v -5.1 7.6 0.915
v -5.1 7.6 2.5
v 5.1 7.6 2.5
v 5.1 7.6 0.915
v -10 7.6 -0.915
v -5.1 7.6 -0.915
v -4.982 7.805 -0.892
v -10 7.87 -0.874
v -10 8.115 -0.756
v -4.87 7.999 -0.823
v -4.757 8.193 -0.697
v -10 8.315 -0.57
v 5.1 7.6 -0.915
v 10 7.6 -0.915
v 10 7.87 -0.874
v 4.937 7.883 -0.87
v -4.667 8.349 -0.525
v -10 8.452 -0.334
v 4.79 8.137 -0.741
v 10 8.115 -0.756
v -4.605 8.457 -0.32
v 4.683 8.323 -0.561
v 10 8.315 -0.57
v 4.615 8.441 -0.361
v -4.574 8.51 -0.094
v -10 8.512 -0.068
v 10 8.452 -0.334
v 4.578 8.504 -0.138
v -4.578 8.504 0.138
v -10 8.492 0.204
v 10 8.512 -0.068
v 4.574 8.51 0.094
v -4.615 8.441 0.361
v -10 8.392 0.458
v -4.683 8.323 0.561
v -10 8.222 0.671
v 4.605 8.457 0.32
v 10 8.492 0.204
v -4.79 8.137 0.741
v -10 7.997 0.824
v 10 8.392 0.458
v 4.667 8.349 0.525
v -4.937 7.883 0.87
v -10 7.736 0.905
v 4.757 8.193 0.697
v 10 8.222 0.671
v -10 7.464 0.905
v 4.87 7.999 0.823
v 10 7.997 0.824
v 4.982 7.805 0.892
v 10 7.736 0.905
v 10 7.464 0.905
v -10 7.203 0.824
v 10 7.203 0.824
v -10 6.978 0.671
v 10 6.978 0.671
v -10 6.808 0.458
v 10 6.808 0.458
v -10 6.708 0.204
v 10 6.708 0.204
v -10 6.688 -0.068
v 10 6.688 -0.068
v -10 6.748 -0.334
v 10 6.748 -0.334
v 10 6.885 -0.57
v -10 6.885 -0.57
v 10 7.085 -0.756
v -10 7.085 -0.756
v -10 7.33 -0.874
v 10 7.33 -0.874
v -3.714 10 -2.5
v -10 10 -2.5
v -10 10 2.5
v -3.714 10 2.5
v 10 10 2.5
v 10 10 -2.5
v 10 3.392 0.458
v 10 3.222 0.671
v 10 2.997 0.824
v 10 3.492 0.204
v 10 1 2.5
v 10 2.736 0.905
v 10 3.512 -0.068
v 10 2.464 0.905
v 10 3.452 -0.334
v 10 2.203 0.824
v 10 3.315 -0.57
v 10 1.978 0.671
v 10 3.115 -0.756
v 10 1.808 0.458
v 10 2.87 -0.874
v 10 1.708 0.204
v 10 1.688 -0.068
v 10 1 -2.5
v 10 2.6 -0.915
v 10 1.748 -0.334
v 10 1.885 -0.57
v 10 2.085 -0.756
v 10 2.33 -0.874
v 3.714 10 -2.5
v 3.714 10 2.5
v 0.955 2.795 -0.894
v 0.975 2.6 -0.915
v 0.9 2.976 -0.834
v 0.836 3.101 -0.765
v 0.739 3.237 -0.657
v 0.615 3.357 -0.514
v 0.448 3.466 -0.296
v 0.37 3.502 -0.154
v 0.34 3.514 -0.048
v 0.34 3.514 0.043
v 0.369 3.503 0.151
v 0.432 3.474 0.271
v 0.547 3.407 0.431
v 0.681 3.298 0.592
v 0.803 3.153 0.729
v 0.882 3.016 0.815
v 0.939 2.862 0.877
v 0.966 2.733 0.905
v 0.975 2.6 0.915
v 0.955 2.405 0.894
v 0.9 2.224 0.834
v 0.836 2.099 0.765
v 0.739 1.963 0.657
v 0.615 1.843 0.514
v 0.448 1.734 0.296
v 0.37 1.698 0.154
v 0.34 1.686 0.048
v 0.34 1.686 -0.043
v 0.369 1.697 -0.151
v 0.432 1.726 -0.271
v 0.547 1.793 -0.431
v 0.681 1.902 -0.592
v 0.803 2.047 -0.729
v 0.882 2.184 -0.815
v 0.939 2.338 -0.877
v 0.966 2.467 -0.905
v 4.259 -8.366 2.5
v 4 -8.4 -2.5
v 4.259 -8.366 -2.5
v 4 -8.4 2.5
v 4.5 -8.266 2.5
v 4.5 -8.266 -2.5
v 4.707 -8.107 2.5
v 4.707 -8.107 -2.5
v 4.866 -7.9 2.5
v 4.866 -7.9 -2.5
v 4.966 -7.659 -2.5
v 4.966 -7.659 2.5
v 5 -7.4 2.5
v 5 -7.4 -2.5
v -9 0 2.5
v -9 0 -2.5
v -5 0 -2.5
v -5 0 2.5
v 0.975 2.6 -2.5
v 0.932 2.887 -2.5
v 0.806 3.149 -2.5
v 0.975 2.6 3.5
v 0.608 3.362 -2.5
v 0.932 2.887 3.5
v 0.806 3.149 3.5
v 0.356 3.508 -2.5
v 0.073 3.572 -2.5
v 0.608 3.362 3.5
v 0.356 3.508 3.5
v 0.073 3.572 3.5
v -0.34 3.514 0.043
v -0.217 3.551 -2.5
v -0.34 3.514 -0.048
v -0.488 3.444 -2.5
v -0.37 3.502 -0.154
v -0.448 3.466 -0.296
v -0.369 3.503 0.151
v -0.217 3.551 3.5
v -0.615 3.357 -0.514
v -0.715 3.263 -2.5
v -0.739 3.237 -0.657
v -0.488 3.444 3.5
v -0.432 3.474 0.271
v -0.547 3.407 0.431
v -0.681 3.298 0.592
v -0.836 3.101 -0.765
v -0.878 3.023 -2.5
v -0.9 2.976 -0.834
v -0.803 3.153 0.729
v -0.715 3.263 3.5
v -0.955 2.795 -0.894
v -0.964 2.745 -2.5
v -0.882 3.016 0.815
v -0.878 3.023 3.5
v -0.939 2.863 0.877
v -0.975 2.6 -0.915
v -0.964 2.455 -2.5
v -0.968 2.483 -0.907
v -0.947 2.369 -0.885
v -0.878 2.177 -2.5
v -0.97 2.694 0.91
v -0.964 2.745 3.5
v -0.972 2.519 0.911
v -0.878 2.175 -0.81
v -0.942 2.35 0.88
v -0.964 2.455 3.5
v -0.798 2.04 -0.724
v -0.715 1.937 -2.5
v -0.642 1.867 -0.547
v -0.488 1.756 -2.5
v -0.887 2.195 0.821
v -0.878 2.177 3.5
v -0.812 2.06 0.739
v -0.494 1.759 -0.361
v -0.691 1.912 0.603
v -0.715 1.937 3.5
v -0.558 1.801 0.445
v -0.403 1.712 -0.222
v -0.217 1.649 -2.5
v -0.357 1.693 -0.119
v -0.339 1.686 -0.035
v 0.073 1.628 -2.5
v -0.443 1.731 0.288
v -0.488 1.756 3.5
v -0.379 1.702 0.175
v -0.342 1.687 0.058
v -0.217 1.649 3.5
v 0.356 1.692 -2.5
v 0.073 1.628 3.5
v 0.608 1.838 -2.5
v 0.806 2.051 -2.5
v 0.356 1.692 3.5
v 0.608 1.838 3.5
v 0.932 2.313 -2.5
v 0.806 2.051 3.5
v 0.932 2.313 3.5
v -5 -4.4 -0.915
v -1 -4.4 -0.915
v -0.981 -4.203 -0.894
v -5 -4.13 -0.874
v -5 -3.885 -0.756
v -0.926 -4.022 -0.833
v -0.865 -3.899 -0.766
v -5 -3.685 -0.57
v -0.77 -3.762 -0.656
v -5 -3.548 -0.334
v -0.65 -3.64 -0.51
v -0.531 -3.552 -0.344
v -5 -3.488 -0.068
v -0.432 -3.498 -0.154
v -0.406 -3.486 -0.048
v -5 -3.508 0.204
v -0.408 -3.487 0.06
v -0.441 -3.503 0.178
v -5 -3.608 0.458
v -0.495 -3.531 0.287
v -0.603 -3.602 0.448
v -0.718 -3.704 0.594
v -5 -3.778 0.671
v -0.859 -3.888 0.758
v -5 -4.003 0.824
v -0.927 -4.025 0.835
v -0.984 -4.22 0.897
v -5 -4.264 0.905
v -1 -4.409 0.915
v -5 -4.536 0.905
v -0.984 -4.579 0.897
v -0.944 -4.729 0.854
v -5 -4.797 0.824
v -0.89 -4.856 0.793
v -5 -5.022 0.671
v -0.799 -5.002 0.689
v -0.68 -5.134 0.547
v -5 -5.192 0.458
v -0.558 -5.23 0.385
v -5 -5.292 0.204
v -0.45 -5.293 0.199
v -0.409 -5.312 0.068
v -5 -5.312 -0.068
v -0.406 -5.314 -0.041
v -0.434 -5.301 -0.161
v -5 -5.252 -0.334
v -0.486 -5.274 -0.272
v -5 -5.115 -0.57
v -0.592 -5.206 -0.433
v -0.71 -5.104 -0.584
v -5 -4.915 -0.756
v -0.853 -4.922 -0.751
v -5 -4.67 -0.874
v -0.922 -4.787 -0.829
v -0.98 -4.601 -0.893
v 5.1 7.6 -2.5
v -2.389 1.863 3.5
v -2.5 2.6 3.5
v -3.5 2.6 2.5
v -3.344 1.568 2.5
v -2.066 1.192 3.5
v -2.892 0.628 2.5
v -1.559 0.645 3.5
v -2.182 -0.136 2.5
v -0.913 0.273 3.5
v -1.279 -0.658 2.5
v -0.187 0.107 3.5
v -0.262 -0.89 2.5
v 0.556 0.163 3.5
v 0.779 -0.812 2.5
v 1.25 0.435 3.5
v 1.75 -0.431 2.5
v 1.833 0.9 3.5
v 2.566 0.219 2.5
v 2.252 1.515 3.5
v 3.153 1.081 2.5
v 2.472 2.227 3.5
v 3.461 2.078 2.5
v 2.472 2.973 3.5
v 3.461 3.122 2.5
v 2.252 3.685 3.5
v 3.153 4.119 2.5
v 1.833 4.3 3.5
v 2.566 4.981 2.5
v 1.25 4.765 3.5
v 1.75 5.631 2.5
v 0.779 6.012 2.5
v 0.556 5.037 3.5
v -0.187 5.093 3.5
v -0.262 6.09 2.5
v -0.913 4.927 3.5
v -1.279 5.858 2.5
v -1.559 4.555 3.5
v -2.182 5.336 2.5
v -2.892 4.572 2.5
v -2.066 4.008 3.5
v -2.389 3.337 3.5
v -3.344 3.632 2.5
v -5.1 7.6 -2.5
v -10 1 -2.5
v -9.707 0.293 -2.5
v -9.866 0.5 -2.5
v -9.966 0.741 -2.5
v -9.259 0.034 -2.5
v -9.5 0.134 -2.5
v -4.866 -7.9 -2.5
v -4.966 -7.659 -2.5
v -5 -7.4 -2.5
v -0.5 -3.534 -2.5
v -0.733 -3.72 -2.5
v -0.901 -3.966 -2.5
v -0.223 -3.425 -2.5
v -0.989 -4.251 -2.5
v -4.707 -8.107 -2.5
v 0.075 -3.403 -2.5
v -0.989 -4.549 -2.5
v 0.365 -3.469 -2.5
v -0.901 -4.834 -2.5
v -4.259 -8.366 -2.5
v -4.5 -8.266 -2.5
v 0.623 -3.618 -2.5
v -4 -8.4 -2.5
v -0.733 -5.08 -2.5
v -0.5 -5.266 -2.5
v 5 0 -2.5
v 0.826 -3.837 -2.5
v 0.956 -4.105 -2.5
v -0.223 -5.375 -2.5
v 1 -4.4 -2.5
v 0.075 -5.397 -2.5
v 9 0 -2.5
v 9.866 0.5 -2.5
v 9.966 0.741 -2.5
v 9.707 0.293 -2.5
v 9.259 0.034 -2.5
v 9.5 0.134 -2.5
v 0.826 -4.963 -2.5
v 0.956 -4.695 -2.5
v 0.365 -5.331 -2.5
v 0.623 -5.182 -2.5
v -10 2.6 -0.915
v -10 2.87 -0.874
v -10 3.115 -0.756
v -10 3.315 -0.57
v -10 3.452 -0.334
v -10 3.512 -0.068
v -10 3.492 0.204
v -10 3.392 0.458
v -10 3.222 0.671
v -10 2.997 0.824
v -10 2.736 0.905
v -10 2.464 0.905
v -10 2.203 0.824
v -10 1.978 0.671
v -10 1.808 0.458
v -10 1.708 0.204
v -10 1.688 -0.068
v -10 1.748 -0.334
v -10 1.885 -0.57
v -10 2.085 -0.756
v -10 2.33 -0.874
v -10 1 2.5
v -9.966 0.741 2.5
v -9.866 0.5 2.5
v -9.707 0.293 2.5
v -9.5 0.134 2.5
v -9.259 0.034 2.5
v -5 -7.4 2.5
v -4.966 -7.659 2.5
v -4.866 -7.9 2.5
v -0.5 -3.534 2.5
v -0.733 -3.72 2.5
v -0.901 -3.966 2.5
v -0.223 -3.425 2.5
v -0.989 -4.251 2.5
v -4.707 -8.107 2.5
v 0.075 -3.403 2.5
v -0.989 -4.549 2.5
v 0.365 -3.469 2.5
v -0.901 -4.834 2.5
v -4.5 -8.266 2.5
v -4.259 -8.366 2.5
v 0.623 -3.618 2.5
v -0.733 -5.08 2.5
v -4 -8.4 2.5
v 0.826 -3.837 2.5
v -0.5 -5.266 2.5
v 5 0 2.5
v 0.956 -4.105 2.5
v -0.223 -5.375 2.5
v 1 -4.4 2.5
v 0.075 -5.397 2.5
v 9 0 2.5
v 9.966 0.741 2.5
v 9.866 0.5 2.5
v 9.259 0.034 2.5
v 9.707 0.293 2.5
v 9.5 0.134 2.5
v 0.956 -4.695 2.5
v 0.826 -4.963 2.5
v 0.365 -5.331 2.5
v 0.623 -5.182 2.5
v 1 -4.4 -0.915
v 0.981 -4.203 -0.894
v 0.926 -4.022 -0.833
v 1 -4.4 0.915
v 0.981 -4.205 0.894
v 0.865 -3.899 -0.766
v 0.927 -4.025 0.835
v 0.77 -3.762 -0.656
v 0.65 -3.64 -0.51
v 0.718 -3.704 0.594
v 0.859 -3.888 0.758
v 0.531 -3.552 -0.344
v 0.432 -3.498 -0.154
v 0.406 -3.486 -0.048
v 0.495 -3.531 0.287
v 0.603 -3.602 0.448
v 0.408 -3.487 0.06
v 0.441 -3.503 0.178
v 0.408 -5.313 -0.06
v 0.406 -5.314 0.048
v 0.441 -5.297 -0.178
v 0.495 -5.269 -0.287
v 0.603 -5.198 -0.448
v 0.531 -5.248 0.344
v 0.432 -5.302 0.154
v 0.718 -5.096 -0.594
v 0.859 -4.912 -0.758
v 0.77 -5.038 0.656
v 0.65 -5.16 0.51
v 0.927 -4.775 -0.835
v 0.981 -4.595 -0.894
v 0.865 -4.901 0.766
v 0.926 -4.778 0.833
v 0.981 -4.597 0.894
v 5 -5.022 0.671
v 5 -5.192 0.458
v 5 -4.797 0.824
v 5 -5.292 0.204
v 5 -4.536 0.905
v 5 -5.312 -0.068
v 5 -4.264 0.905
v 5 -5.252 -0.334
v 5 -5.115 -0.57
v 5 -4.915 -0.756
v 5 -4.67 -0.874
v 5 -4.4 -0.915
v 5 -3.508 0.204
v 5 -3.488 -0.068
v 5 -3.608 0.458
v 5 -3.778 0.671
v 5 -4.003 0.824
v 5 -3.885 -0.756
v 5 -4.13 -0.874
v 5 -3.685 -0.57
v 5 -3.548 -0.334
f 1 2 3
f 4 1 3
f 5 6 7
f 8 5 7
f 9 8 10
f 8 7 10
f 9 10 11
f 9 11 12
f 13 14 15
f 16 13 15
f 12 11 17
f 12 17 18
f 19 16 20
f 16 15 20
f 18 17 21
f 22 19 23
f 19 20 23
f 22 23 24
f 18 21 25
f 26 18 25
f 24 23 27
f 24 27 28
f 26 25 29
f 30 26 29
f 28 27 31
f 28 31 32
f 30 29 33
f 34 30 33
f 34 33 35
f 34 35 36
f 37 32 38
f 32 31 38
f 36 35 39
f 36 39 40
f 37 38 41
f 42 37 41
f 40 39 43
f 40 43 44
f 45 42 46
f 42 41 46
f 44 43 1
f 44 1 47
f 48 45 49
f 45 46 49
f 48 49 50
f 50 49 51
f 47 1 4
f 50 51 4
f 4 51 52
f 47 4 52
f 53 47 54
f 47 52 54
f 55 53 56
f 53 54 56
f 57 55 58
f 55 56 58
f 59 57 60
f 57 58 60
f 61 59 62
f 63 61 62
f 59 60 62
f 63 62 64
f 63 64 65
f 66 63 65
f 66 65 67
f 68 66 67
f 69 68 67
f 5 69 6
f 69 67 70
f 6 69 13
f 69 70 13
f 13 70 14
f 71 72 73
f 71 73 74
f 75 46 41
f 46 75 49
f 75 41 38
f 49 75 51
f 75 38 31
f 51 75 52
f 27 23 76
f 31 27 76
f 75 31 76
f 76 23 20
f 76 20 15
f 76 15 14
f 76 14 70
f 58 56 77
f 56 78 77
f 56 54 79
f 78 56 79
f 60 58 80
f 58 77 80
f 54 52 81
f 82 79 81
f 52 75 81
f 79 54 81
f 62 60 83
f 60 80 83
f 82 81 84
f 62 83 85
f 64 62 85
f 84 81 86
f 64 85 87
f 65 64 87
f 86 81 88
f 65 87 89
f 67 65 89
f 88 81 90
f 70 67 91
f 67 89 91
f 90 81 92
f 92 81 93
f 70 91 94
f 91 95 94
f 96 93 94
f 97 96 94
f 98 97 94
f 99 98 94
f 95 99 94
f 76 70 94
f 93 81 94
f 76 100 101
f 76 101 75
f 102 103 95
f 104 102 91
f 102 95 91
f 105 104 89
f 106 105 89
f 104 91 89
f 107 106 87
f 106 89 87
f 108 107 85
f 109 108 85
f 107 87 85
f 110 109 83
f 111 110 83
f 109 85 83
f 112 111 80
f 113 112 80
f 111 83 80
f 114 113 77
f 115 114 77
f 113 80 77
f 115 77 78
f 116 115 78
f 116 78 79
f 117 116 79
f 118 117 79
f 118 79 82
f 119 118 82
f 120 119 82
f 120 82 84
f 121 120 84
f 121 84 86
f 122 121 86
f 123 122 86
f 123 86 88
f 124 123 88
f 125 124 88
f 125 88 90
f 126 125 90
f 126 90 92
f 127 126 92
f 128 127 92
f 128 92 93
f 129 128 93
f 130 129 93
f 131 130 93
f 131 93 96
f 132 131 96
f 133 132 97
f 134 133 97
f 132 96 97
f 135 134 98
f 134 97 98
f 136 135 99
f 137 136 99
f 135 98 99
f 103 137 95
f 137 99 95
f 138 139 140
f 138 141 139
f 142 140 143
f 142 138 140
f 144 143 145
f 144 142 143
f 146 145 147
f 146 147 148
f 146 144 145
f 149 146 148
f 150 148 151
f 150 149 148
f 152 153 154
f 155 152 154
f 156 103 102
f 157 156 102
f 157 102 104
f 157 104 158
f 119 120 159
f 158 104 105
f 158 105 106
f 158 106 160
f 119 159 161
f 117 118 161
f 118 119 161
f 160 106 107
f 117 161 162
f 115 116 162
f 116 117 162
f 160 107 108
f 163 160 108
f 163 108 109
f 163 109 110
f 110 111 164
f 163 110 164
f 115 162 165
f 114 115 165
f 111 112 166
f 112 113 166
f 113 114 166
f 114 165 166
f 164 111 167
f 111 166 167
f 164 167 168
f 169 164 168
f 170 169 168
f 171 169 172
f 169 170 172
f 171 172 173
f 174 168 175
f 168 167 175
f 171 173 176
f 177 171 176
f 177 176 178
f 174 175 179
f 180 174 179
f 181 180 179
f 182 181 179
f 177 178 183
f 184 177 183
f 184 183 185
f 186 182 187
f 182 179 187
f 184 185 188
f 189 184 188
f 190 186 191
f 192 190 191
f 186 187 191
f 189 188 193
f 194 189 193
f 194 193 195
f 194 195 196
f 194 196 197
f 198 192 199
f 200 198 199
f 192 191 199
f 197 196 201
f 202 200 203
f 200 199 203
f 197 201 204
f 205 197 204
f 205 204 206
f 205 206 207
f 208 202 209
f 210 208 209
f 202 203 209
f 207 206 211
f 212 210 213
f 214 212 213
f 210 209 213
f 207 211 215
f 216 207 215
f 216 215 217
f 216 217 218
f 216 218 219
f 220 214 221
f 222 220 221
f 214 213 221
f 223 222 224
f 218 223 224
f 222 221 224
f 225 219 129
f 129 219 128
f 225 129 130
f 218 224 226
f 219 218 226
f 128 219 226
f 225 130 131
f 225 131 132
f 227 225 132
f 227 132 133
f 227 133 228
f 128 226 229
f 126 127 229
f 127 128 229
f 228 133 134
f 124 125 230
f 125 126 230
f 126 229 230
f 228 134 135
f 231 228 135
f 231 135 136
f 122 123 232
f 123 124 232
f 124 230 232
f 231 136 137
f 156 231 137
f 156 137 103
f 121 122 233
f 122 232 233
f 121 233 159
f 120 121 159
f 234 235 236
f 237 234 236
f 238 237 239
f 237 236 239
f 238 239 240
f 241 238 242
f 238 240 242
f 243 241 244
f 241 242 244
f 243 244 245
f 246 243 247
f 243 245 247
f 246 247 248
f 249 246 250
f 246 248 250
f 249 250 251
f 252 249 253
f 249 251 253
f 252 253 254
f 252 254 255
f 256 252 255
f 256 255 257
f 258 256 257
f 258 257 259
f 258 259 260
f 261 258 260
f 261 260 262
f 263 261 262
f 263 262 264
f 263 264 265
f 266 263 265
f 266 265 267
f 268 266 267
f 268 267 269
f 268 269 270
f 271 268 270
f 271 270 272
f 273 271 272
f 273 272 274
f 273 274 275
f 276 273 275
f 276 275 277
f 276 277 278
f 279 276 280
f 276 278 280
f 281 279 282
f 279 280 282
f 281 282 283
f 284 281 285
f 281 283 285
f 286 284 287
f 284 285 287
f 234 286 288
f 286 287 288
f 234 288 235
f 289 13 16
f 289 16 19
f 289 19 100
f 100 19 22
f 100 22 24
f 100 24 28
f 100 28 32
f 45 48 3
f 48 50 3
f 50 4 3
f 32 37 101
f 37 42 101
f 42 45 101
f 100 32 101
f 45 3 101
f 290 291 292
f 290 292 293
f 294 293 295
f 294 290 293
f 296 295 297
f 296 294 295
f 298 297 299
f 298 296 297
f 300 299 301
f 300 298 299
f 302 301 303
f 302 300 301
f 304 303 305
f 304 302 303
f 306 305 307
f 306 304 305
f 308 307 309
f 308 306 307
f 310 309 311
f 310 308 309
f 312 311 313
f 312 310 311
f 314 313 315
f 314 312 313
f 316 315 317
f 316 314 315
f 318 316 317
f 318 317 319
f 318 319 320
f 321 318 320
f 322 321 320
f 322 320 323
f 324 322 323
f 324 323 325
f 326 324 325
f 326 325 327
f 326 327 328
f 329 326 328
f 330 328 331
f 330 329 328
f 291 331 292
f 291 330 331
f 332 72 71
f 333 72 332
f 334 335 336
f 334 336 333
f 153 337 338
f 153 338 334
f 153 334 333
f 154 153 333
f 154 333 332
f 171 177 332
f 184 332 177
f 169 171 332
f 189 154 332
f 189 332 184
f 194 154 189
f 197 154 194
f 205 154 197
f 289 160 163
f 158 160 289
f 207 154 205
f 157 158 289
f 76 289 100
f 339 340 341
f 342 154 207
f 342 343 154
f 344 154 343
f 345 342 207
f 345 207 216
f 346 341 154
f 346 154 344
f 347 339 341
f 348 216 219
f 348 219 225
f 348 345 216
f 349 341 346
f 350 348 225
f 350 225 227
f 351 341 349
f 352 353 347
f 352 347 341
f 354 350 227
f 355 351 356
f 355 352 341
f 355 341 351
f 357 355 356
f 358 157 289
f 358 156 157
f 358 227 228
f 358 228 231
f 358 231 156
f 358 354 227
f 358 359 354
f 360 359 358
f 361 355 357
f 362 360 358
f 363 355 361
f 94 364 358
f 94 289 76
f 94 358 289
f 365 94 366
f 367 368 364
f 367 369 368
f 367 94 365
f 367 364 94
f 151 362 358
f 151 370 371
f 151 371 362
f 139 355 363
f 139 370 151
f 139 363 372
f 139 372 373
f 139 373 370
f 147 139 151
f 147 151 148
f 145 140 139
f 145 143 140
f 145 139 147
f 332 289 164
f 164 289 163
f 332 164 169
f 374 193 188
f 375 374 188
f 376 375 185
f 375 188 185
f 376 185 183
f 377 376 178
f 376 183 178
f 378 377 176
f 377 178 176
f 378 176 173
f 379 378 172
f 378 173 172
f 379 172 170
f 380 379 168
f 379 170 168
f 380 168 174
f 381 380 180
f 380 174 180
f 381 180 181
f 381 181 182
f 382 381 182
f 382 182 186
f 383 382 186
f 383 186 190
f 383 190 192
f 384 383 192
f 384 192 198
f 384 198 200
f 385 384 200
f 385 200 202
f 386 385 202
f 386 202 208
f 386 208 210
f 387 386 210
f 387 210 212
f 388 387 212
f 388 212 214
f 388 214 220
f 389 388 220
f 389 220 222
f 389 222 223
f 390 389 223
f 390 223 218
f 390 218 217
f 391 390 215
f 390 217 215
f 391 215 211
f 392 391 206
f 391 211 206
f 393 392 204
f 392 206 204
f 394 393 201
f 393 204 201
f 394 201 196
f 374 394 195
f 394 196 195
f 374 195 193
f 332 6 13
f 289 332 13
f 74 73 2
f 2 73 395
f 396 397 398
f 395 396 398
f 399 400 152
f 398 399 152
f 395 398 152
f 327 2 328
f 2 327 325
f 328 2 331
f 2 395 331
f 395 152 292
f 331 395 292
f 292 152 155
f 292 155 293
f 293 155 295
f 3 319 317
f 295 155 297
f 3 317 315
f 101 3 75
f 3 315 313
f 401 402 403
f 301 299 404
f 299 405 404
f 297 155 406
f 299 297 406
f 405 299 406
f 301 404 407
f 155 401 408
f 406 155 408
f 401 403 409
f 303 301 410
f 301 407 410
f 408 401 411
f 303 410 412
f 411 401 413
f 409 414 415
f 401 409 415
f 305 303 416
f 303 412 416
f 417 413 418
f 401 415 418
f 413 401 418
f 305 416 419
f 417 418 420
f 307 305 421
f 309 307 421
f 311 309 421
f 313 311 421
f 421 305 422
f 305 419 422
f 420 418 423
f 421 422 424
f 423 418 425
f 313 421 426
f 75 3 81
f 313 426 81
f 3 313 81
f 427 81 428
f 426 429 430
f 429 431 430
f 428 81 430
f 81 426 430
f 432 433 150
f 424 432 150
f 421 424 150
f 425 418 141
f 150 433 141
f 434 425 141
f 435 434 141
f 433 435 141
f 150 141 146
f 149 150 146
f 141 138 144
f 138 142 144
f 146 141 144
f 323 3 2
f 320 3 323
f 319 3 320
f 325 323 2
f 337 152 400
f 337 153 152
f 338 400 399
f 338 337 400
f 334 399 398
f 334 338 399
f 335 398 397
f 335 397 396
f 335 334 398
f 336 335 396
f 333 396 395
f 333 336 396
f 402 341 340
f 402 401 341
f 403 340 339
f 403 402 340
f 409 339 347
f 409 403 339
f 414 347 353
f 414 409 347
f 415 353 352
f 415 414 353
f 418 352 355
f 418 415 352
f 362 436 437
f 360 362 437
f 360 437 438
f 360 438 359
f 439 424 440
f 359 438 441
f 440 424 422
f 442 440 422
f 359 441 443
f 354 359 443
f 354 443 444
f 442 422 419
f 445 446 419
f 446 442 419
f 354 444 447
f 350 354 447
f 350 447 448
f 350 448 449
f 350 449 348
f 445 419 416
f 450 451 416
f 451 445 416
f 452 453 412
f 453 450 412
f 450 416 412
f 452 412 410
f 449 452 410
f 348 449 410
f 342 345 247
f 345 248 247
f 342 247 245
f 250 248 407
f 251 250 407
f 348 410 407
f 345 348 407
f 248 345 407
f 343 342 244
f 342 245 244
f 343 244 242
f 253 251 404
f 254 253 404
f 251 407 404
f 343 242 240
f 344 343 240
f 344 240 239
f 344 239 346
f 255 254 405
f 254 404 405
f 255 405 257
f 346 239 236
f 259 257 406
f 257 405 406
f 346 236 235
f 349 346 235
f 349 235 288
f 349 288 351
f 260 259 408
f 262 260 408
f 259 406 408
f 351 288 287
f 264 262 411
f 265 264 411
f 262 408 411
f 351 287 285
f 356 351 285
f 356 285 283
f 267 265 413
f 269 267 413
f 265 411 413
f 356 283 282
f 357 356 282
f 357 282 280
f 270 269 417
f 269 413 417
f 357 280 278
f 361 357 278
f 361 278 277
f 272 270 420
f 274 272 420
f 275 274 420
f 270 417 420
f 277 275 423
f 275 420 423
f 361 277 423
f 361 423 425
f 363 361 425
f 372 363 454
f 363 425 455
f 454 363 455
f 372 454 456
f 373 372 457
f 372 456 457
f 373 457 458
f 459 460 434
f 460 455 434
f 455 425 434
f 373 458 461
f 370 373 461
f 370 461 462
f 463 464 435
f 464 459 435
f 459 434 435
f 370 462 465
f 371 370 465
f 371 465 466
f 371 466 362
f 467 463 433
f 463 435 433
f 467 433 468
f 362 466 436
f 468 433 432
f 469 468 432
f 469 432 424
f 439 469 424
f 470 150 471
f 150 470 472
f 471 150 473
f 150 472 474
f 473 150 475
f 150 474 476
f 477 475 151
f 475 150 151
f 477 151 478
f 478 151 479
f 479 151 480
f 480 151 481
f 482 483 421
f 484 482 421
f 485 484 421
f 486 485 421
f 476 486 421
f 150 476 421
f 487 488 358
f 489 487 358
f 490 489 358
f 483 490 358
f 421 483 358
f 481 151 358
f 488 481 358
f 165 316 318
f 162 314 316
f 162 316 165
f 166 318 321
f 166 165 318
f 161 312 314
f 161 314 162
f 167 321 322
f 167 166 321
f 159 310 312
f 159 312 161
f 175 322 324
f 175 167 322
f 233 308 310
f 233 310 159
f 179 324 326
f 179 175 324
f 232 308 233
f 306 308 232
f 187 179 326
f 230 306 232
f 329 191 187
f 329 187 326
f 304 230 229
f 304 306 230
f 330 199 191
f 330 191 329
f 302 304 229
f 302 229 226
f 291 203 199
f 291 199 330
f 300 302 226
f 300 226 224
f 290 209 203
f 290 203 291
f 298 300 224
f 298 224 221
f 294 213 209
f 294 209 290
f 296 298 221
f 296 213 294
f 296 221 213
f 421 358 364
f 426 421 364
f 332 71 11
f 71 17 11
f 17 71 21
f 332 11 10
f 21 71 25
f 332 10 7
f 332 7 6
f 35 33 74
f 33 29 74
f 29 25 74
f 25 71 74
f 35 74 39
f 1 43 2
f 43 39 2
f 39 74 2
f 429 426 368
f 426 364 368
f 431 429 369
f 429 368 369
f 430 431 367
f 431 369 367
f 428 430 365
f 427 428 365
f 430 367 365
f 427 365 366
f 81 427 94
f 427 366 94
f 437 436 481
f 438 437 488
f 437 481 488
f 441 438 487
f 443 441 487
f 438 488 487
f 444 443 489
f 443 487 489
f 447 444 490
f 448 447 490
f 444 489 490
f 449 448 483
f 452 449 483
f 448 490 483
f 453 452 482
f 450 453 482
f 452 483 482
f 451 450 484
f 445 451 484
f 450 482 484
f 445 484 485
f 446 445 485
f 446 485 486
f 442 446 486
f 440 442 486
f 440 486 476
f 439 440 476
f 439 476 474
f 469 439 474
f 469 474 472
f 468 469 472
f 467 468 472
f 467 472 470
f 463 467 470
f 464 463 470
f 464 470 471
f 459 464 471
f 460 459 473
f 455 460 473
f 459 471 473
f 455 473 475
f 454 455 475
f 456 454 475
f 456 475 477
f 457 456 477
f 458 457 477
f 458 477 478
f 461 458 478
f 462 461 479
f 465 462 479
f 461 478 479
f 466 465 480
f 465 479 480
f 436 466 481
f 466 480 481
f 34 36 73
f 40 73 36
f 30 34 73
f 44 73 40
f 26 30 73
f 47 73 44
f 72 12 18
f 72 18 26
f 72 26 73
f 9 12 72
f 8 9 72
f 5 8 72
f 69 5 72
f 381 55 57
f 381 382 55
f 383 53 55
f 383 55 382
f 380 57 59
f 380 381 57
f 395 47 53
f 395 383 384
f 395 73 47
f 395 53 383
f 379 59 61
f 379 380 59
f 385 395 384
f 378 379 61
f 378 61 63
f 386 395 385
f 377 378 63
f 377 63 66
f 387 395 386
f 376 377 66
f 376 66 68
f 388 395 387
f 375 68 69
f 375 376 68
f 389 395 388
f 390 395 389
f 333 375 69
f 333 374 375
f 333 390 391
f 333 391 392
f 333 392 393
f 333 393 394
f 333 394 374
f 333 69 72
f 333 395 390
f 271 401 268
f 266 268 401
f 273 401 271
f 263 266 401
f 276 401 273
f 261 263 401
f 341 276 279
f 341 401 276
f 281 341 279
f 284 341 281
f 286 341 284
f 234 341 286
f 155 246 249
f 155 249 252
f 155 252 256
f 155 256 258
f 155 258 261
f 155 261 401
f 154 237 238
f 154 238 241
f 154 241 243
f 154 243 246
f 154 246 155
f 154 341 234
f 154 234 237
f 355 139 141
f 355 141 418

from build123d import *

# Parameters (mm, degrees)
SKETCH1_W           = 20
SKETCH1_H           = 5
BOSS_EXTRUDE1_DEPTH = 10
CUT_EXTRUDE1_DEPTH  = 16
SKETCH8_R           = 0.915
CUT_EXTRUDE6_DEPTH  = 23.5
SKETCH7_R           = 0.915
CUT_EXTRUDE5_DEPTH  = 23.5
SKETCH10_R          = 2.5
BOSS_EXTRUDE4_DEPTH = 1
SKETCH5_W           = 10
SKETCH5_H           = 8.4
BOSS_EXTRUDE3_DEPTH = 5
SKETCH6_R           = 1
CUT_EXTRUDE4_DEPTH  = 16
CUT_EXTRUDE7_REACH  = 20.364
SKETCH9_R           = 0.915
SKETCH11_R          = 0.975
CUT_EXTRUDE8_DEPTH  = 16.362291535
CHAMFER1_SIZE       = 1
FILLET1_R           = 1


with BuildPart() as part:
    # Sketch1 → Boss-Extrude1 (new body)
    with BuildSketch(Plane(origin=(0, 0, 0), x_dir=(1, 0, 0), z_dir=(0, 1, 0))):
        Rectangle(SKETCH1_W, SKETCH1_H)
    extrude(amount=BOSS_EXTRUDE1_DEPTH)

    # Sketch2 → Cut-Extrude1 (cut, through all)
    with BuildSketch(Plane.XY.offset(2.5)):
        Polygon((3.714359354, 10), (-3.714359354, 10), (-5.1, 7.6), (5.1, 7.6), align=None)
    extrude(amount=-CUT_EXTRUDE1_DEPTH, mode=Mode.SUBTRACT)

    # Sketch8 → Cut-Extrude6 (cut, through all)
    with BuildSketch(Plane(origin=(10, 0, 0), x_dir=(0, 0, -1), z_dir=(1, 0, 0))):
        with Locations((0, 7.6)):
            Circle(SKETCH8_R)
    extrude(amount=-CUT_EXTRUDE6_DEPTH, mode=Mode.SUBTRACT)

    # Sketch7 → Cut-Extrude5 (cut, through all)
    with BuildSketch(Plane(origin=(10, 0, 0), x_dir=(0, 0, -1), z_dir=(1, 0, 0))):
        with Locations((0, 2.6)):
            Circle(SKETCH7_R)
    extrude(amount=-CUT_EXTRUDE5_DEPTH, mode=Mode.SUBTRACT)

    # Sketch10 → Boss-Extrude4 (add)
    with BuildSketch(Plane.XY.offset(2.5)):
        with Locations(Location((0, 2.6, 0), (0, 0, 180))):
            Circle(SKETCH10_R)
    extrude(amount=BOSS_EXTRUDE4_DEPTH)

    # Sketch5 → Boss-Extrude3 (add)
    with BuildSketch(Plane(origin=(0, 0, -2.5), x_dir=(-1, 0, 0), z_dir=(0, 0, -1))):
        with Locations((0, -4.2)):
            Rectangle(SKETCH5_W, SKETCH5_H)
    extrude(amount=-BOSS_EXTRUDE3_DEPTH)

    # Sketch6 → Cut-Extrude4 (cut, through all)
    with BuildSketch(Plane.XY.offset(2.5)):
        with Locations((0, -4.4)):
            Circle(SKETCH6_R)
    extrude(amount=-CUT_EXTRUDE4_DEPTH, mode=Mode.SUBTRACT)

    # Cut-Extrude7: up to this face of the body (flat: up to its plane)
    cut_extrude7_end = Plane(part.part.faces().sort_by_distance((-5, -4.2, 0))[0])
    # Sketch9 → Cut-Extrude7 (cut, up to the picked face)
    with BuildSketch(Plane(origin=(5, 0, 0), x_dir=(0, 0, -1), z_dir=(1, 0, 0)), mode=Mode.PRIVATE) as cut_extrude7_sk1:
        with Locations((0, -4.4)):
            Circle(SKETCH9_R)
    cut_extrude7_tool1 = split(extrude(cut_extrude7_sk1.sketch, amount=-CUT_EXTRUDE7_REACH, mode=Mode.PRIVATE), bisect_by=cut_extrude7_end, keep=Keep.BOTH, mode=Mode.PRIVATE)
    add(cut_extrude7_tool1.solids().sort_by(Axis((5, -4.4, 0), (-1, 0, 0)))[0], mode=Mode.SUBTRACT)

    # Sketch11 → Cut-Extrude8 (cut, through all)
    with BuildSketch(Plane.XY.offset(3.5)):
        with Locations((0, 2.6)):
            Circle(SKETCH11_R)
    extrude(amount=-CUT_EXTRUDE8_DEPTH, mode=Mode.SUBTRACT)

    # Chamfer1
    chamfer1_edges = [part.edges().sort_by_distance(p)[0] for p in [
        (2.5, 2.6, 2.5),
    ]]
    chamfer(chamfer1_edges, length=CHAMFER1_SIZE - 0.0001)  # a hair under: the kernel refuses the full size

    # Fillet1
    fillet1_edges = [part.edges().sort_by_distance(p)[0] for p in [
        (-10, 0, 0),
        (-5, -8.4, 0),
        (5, -8.4, 0),
        (10, 0, 0),
    ]]
    fillet(fillet1_edges, radius=FILLET1_R)


solid = part.part
